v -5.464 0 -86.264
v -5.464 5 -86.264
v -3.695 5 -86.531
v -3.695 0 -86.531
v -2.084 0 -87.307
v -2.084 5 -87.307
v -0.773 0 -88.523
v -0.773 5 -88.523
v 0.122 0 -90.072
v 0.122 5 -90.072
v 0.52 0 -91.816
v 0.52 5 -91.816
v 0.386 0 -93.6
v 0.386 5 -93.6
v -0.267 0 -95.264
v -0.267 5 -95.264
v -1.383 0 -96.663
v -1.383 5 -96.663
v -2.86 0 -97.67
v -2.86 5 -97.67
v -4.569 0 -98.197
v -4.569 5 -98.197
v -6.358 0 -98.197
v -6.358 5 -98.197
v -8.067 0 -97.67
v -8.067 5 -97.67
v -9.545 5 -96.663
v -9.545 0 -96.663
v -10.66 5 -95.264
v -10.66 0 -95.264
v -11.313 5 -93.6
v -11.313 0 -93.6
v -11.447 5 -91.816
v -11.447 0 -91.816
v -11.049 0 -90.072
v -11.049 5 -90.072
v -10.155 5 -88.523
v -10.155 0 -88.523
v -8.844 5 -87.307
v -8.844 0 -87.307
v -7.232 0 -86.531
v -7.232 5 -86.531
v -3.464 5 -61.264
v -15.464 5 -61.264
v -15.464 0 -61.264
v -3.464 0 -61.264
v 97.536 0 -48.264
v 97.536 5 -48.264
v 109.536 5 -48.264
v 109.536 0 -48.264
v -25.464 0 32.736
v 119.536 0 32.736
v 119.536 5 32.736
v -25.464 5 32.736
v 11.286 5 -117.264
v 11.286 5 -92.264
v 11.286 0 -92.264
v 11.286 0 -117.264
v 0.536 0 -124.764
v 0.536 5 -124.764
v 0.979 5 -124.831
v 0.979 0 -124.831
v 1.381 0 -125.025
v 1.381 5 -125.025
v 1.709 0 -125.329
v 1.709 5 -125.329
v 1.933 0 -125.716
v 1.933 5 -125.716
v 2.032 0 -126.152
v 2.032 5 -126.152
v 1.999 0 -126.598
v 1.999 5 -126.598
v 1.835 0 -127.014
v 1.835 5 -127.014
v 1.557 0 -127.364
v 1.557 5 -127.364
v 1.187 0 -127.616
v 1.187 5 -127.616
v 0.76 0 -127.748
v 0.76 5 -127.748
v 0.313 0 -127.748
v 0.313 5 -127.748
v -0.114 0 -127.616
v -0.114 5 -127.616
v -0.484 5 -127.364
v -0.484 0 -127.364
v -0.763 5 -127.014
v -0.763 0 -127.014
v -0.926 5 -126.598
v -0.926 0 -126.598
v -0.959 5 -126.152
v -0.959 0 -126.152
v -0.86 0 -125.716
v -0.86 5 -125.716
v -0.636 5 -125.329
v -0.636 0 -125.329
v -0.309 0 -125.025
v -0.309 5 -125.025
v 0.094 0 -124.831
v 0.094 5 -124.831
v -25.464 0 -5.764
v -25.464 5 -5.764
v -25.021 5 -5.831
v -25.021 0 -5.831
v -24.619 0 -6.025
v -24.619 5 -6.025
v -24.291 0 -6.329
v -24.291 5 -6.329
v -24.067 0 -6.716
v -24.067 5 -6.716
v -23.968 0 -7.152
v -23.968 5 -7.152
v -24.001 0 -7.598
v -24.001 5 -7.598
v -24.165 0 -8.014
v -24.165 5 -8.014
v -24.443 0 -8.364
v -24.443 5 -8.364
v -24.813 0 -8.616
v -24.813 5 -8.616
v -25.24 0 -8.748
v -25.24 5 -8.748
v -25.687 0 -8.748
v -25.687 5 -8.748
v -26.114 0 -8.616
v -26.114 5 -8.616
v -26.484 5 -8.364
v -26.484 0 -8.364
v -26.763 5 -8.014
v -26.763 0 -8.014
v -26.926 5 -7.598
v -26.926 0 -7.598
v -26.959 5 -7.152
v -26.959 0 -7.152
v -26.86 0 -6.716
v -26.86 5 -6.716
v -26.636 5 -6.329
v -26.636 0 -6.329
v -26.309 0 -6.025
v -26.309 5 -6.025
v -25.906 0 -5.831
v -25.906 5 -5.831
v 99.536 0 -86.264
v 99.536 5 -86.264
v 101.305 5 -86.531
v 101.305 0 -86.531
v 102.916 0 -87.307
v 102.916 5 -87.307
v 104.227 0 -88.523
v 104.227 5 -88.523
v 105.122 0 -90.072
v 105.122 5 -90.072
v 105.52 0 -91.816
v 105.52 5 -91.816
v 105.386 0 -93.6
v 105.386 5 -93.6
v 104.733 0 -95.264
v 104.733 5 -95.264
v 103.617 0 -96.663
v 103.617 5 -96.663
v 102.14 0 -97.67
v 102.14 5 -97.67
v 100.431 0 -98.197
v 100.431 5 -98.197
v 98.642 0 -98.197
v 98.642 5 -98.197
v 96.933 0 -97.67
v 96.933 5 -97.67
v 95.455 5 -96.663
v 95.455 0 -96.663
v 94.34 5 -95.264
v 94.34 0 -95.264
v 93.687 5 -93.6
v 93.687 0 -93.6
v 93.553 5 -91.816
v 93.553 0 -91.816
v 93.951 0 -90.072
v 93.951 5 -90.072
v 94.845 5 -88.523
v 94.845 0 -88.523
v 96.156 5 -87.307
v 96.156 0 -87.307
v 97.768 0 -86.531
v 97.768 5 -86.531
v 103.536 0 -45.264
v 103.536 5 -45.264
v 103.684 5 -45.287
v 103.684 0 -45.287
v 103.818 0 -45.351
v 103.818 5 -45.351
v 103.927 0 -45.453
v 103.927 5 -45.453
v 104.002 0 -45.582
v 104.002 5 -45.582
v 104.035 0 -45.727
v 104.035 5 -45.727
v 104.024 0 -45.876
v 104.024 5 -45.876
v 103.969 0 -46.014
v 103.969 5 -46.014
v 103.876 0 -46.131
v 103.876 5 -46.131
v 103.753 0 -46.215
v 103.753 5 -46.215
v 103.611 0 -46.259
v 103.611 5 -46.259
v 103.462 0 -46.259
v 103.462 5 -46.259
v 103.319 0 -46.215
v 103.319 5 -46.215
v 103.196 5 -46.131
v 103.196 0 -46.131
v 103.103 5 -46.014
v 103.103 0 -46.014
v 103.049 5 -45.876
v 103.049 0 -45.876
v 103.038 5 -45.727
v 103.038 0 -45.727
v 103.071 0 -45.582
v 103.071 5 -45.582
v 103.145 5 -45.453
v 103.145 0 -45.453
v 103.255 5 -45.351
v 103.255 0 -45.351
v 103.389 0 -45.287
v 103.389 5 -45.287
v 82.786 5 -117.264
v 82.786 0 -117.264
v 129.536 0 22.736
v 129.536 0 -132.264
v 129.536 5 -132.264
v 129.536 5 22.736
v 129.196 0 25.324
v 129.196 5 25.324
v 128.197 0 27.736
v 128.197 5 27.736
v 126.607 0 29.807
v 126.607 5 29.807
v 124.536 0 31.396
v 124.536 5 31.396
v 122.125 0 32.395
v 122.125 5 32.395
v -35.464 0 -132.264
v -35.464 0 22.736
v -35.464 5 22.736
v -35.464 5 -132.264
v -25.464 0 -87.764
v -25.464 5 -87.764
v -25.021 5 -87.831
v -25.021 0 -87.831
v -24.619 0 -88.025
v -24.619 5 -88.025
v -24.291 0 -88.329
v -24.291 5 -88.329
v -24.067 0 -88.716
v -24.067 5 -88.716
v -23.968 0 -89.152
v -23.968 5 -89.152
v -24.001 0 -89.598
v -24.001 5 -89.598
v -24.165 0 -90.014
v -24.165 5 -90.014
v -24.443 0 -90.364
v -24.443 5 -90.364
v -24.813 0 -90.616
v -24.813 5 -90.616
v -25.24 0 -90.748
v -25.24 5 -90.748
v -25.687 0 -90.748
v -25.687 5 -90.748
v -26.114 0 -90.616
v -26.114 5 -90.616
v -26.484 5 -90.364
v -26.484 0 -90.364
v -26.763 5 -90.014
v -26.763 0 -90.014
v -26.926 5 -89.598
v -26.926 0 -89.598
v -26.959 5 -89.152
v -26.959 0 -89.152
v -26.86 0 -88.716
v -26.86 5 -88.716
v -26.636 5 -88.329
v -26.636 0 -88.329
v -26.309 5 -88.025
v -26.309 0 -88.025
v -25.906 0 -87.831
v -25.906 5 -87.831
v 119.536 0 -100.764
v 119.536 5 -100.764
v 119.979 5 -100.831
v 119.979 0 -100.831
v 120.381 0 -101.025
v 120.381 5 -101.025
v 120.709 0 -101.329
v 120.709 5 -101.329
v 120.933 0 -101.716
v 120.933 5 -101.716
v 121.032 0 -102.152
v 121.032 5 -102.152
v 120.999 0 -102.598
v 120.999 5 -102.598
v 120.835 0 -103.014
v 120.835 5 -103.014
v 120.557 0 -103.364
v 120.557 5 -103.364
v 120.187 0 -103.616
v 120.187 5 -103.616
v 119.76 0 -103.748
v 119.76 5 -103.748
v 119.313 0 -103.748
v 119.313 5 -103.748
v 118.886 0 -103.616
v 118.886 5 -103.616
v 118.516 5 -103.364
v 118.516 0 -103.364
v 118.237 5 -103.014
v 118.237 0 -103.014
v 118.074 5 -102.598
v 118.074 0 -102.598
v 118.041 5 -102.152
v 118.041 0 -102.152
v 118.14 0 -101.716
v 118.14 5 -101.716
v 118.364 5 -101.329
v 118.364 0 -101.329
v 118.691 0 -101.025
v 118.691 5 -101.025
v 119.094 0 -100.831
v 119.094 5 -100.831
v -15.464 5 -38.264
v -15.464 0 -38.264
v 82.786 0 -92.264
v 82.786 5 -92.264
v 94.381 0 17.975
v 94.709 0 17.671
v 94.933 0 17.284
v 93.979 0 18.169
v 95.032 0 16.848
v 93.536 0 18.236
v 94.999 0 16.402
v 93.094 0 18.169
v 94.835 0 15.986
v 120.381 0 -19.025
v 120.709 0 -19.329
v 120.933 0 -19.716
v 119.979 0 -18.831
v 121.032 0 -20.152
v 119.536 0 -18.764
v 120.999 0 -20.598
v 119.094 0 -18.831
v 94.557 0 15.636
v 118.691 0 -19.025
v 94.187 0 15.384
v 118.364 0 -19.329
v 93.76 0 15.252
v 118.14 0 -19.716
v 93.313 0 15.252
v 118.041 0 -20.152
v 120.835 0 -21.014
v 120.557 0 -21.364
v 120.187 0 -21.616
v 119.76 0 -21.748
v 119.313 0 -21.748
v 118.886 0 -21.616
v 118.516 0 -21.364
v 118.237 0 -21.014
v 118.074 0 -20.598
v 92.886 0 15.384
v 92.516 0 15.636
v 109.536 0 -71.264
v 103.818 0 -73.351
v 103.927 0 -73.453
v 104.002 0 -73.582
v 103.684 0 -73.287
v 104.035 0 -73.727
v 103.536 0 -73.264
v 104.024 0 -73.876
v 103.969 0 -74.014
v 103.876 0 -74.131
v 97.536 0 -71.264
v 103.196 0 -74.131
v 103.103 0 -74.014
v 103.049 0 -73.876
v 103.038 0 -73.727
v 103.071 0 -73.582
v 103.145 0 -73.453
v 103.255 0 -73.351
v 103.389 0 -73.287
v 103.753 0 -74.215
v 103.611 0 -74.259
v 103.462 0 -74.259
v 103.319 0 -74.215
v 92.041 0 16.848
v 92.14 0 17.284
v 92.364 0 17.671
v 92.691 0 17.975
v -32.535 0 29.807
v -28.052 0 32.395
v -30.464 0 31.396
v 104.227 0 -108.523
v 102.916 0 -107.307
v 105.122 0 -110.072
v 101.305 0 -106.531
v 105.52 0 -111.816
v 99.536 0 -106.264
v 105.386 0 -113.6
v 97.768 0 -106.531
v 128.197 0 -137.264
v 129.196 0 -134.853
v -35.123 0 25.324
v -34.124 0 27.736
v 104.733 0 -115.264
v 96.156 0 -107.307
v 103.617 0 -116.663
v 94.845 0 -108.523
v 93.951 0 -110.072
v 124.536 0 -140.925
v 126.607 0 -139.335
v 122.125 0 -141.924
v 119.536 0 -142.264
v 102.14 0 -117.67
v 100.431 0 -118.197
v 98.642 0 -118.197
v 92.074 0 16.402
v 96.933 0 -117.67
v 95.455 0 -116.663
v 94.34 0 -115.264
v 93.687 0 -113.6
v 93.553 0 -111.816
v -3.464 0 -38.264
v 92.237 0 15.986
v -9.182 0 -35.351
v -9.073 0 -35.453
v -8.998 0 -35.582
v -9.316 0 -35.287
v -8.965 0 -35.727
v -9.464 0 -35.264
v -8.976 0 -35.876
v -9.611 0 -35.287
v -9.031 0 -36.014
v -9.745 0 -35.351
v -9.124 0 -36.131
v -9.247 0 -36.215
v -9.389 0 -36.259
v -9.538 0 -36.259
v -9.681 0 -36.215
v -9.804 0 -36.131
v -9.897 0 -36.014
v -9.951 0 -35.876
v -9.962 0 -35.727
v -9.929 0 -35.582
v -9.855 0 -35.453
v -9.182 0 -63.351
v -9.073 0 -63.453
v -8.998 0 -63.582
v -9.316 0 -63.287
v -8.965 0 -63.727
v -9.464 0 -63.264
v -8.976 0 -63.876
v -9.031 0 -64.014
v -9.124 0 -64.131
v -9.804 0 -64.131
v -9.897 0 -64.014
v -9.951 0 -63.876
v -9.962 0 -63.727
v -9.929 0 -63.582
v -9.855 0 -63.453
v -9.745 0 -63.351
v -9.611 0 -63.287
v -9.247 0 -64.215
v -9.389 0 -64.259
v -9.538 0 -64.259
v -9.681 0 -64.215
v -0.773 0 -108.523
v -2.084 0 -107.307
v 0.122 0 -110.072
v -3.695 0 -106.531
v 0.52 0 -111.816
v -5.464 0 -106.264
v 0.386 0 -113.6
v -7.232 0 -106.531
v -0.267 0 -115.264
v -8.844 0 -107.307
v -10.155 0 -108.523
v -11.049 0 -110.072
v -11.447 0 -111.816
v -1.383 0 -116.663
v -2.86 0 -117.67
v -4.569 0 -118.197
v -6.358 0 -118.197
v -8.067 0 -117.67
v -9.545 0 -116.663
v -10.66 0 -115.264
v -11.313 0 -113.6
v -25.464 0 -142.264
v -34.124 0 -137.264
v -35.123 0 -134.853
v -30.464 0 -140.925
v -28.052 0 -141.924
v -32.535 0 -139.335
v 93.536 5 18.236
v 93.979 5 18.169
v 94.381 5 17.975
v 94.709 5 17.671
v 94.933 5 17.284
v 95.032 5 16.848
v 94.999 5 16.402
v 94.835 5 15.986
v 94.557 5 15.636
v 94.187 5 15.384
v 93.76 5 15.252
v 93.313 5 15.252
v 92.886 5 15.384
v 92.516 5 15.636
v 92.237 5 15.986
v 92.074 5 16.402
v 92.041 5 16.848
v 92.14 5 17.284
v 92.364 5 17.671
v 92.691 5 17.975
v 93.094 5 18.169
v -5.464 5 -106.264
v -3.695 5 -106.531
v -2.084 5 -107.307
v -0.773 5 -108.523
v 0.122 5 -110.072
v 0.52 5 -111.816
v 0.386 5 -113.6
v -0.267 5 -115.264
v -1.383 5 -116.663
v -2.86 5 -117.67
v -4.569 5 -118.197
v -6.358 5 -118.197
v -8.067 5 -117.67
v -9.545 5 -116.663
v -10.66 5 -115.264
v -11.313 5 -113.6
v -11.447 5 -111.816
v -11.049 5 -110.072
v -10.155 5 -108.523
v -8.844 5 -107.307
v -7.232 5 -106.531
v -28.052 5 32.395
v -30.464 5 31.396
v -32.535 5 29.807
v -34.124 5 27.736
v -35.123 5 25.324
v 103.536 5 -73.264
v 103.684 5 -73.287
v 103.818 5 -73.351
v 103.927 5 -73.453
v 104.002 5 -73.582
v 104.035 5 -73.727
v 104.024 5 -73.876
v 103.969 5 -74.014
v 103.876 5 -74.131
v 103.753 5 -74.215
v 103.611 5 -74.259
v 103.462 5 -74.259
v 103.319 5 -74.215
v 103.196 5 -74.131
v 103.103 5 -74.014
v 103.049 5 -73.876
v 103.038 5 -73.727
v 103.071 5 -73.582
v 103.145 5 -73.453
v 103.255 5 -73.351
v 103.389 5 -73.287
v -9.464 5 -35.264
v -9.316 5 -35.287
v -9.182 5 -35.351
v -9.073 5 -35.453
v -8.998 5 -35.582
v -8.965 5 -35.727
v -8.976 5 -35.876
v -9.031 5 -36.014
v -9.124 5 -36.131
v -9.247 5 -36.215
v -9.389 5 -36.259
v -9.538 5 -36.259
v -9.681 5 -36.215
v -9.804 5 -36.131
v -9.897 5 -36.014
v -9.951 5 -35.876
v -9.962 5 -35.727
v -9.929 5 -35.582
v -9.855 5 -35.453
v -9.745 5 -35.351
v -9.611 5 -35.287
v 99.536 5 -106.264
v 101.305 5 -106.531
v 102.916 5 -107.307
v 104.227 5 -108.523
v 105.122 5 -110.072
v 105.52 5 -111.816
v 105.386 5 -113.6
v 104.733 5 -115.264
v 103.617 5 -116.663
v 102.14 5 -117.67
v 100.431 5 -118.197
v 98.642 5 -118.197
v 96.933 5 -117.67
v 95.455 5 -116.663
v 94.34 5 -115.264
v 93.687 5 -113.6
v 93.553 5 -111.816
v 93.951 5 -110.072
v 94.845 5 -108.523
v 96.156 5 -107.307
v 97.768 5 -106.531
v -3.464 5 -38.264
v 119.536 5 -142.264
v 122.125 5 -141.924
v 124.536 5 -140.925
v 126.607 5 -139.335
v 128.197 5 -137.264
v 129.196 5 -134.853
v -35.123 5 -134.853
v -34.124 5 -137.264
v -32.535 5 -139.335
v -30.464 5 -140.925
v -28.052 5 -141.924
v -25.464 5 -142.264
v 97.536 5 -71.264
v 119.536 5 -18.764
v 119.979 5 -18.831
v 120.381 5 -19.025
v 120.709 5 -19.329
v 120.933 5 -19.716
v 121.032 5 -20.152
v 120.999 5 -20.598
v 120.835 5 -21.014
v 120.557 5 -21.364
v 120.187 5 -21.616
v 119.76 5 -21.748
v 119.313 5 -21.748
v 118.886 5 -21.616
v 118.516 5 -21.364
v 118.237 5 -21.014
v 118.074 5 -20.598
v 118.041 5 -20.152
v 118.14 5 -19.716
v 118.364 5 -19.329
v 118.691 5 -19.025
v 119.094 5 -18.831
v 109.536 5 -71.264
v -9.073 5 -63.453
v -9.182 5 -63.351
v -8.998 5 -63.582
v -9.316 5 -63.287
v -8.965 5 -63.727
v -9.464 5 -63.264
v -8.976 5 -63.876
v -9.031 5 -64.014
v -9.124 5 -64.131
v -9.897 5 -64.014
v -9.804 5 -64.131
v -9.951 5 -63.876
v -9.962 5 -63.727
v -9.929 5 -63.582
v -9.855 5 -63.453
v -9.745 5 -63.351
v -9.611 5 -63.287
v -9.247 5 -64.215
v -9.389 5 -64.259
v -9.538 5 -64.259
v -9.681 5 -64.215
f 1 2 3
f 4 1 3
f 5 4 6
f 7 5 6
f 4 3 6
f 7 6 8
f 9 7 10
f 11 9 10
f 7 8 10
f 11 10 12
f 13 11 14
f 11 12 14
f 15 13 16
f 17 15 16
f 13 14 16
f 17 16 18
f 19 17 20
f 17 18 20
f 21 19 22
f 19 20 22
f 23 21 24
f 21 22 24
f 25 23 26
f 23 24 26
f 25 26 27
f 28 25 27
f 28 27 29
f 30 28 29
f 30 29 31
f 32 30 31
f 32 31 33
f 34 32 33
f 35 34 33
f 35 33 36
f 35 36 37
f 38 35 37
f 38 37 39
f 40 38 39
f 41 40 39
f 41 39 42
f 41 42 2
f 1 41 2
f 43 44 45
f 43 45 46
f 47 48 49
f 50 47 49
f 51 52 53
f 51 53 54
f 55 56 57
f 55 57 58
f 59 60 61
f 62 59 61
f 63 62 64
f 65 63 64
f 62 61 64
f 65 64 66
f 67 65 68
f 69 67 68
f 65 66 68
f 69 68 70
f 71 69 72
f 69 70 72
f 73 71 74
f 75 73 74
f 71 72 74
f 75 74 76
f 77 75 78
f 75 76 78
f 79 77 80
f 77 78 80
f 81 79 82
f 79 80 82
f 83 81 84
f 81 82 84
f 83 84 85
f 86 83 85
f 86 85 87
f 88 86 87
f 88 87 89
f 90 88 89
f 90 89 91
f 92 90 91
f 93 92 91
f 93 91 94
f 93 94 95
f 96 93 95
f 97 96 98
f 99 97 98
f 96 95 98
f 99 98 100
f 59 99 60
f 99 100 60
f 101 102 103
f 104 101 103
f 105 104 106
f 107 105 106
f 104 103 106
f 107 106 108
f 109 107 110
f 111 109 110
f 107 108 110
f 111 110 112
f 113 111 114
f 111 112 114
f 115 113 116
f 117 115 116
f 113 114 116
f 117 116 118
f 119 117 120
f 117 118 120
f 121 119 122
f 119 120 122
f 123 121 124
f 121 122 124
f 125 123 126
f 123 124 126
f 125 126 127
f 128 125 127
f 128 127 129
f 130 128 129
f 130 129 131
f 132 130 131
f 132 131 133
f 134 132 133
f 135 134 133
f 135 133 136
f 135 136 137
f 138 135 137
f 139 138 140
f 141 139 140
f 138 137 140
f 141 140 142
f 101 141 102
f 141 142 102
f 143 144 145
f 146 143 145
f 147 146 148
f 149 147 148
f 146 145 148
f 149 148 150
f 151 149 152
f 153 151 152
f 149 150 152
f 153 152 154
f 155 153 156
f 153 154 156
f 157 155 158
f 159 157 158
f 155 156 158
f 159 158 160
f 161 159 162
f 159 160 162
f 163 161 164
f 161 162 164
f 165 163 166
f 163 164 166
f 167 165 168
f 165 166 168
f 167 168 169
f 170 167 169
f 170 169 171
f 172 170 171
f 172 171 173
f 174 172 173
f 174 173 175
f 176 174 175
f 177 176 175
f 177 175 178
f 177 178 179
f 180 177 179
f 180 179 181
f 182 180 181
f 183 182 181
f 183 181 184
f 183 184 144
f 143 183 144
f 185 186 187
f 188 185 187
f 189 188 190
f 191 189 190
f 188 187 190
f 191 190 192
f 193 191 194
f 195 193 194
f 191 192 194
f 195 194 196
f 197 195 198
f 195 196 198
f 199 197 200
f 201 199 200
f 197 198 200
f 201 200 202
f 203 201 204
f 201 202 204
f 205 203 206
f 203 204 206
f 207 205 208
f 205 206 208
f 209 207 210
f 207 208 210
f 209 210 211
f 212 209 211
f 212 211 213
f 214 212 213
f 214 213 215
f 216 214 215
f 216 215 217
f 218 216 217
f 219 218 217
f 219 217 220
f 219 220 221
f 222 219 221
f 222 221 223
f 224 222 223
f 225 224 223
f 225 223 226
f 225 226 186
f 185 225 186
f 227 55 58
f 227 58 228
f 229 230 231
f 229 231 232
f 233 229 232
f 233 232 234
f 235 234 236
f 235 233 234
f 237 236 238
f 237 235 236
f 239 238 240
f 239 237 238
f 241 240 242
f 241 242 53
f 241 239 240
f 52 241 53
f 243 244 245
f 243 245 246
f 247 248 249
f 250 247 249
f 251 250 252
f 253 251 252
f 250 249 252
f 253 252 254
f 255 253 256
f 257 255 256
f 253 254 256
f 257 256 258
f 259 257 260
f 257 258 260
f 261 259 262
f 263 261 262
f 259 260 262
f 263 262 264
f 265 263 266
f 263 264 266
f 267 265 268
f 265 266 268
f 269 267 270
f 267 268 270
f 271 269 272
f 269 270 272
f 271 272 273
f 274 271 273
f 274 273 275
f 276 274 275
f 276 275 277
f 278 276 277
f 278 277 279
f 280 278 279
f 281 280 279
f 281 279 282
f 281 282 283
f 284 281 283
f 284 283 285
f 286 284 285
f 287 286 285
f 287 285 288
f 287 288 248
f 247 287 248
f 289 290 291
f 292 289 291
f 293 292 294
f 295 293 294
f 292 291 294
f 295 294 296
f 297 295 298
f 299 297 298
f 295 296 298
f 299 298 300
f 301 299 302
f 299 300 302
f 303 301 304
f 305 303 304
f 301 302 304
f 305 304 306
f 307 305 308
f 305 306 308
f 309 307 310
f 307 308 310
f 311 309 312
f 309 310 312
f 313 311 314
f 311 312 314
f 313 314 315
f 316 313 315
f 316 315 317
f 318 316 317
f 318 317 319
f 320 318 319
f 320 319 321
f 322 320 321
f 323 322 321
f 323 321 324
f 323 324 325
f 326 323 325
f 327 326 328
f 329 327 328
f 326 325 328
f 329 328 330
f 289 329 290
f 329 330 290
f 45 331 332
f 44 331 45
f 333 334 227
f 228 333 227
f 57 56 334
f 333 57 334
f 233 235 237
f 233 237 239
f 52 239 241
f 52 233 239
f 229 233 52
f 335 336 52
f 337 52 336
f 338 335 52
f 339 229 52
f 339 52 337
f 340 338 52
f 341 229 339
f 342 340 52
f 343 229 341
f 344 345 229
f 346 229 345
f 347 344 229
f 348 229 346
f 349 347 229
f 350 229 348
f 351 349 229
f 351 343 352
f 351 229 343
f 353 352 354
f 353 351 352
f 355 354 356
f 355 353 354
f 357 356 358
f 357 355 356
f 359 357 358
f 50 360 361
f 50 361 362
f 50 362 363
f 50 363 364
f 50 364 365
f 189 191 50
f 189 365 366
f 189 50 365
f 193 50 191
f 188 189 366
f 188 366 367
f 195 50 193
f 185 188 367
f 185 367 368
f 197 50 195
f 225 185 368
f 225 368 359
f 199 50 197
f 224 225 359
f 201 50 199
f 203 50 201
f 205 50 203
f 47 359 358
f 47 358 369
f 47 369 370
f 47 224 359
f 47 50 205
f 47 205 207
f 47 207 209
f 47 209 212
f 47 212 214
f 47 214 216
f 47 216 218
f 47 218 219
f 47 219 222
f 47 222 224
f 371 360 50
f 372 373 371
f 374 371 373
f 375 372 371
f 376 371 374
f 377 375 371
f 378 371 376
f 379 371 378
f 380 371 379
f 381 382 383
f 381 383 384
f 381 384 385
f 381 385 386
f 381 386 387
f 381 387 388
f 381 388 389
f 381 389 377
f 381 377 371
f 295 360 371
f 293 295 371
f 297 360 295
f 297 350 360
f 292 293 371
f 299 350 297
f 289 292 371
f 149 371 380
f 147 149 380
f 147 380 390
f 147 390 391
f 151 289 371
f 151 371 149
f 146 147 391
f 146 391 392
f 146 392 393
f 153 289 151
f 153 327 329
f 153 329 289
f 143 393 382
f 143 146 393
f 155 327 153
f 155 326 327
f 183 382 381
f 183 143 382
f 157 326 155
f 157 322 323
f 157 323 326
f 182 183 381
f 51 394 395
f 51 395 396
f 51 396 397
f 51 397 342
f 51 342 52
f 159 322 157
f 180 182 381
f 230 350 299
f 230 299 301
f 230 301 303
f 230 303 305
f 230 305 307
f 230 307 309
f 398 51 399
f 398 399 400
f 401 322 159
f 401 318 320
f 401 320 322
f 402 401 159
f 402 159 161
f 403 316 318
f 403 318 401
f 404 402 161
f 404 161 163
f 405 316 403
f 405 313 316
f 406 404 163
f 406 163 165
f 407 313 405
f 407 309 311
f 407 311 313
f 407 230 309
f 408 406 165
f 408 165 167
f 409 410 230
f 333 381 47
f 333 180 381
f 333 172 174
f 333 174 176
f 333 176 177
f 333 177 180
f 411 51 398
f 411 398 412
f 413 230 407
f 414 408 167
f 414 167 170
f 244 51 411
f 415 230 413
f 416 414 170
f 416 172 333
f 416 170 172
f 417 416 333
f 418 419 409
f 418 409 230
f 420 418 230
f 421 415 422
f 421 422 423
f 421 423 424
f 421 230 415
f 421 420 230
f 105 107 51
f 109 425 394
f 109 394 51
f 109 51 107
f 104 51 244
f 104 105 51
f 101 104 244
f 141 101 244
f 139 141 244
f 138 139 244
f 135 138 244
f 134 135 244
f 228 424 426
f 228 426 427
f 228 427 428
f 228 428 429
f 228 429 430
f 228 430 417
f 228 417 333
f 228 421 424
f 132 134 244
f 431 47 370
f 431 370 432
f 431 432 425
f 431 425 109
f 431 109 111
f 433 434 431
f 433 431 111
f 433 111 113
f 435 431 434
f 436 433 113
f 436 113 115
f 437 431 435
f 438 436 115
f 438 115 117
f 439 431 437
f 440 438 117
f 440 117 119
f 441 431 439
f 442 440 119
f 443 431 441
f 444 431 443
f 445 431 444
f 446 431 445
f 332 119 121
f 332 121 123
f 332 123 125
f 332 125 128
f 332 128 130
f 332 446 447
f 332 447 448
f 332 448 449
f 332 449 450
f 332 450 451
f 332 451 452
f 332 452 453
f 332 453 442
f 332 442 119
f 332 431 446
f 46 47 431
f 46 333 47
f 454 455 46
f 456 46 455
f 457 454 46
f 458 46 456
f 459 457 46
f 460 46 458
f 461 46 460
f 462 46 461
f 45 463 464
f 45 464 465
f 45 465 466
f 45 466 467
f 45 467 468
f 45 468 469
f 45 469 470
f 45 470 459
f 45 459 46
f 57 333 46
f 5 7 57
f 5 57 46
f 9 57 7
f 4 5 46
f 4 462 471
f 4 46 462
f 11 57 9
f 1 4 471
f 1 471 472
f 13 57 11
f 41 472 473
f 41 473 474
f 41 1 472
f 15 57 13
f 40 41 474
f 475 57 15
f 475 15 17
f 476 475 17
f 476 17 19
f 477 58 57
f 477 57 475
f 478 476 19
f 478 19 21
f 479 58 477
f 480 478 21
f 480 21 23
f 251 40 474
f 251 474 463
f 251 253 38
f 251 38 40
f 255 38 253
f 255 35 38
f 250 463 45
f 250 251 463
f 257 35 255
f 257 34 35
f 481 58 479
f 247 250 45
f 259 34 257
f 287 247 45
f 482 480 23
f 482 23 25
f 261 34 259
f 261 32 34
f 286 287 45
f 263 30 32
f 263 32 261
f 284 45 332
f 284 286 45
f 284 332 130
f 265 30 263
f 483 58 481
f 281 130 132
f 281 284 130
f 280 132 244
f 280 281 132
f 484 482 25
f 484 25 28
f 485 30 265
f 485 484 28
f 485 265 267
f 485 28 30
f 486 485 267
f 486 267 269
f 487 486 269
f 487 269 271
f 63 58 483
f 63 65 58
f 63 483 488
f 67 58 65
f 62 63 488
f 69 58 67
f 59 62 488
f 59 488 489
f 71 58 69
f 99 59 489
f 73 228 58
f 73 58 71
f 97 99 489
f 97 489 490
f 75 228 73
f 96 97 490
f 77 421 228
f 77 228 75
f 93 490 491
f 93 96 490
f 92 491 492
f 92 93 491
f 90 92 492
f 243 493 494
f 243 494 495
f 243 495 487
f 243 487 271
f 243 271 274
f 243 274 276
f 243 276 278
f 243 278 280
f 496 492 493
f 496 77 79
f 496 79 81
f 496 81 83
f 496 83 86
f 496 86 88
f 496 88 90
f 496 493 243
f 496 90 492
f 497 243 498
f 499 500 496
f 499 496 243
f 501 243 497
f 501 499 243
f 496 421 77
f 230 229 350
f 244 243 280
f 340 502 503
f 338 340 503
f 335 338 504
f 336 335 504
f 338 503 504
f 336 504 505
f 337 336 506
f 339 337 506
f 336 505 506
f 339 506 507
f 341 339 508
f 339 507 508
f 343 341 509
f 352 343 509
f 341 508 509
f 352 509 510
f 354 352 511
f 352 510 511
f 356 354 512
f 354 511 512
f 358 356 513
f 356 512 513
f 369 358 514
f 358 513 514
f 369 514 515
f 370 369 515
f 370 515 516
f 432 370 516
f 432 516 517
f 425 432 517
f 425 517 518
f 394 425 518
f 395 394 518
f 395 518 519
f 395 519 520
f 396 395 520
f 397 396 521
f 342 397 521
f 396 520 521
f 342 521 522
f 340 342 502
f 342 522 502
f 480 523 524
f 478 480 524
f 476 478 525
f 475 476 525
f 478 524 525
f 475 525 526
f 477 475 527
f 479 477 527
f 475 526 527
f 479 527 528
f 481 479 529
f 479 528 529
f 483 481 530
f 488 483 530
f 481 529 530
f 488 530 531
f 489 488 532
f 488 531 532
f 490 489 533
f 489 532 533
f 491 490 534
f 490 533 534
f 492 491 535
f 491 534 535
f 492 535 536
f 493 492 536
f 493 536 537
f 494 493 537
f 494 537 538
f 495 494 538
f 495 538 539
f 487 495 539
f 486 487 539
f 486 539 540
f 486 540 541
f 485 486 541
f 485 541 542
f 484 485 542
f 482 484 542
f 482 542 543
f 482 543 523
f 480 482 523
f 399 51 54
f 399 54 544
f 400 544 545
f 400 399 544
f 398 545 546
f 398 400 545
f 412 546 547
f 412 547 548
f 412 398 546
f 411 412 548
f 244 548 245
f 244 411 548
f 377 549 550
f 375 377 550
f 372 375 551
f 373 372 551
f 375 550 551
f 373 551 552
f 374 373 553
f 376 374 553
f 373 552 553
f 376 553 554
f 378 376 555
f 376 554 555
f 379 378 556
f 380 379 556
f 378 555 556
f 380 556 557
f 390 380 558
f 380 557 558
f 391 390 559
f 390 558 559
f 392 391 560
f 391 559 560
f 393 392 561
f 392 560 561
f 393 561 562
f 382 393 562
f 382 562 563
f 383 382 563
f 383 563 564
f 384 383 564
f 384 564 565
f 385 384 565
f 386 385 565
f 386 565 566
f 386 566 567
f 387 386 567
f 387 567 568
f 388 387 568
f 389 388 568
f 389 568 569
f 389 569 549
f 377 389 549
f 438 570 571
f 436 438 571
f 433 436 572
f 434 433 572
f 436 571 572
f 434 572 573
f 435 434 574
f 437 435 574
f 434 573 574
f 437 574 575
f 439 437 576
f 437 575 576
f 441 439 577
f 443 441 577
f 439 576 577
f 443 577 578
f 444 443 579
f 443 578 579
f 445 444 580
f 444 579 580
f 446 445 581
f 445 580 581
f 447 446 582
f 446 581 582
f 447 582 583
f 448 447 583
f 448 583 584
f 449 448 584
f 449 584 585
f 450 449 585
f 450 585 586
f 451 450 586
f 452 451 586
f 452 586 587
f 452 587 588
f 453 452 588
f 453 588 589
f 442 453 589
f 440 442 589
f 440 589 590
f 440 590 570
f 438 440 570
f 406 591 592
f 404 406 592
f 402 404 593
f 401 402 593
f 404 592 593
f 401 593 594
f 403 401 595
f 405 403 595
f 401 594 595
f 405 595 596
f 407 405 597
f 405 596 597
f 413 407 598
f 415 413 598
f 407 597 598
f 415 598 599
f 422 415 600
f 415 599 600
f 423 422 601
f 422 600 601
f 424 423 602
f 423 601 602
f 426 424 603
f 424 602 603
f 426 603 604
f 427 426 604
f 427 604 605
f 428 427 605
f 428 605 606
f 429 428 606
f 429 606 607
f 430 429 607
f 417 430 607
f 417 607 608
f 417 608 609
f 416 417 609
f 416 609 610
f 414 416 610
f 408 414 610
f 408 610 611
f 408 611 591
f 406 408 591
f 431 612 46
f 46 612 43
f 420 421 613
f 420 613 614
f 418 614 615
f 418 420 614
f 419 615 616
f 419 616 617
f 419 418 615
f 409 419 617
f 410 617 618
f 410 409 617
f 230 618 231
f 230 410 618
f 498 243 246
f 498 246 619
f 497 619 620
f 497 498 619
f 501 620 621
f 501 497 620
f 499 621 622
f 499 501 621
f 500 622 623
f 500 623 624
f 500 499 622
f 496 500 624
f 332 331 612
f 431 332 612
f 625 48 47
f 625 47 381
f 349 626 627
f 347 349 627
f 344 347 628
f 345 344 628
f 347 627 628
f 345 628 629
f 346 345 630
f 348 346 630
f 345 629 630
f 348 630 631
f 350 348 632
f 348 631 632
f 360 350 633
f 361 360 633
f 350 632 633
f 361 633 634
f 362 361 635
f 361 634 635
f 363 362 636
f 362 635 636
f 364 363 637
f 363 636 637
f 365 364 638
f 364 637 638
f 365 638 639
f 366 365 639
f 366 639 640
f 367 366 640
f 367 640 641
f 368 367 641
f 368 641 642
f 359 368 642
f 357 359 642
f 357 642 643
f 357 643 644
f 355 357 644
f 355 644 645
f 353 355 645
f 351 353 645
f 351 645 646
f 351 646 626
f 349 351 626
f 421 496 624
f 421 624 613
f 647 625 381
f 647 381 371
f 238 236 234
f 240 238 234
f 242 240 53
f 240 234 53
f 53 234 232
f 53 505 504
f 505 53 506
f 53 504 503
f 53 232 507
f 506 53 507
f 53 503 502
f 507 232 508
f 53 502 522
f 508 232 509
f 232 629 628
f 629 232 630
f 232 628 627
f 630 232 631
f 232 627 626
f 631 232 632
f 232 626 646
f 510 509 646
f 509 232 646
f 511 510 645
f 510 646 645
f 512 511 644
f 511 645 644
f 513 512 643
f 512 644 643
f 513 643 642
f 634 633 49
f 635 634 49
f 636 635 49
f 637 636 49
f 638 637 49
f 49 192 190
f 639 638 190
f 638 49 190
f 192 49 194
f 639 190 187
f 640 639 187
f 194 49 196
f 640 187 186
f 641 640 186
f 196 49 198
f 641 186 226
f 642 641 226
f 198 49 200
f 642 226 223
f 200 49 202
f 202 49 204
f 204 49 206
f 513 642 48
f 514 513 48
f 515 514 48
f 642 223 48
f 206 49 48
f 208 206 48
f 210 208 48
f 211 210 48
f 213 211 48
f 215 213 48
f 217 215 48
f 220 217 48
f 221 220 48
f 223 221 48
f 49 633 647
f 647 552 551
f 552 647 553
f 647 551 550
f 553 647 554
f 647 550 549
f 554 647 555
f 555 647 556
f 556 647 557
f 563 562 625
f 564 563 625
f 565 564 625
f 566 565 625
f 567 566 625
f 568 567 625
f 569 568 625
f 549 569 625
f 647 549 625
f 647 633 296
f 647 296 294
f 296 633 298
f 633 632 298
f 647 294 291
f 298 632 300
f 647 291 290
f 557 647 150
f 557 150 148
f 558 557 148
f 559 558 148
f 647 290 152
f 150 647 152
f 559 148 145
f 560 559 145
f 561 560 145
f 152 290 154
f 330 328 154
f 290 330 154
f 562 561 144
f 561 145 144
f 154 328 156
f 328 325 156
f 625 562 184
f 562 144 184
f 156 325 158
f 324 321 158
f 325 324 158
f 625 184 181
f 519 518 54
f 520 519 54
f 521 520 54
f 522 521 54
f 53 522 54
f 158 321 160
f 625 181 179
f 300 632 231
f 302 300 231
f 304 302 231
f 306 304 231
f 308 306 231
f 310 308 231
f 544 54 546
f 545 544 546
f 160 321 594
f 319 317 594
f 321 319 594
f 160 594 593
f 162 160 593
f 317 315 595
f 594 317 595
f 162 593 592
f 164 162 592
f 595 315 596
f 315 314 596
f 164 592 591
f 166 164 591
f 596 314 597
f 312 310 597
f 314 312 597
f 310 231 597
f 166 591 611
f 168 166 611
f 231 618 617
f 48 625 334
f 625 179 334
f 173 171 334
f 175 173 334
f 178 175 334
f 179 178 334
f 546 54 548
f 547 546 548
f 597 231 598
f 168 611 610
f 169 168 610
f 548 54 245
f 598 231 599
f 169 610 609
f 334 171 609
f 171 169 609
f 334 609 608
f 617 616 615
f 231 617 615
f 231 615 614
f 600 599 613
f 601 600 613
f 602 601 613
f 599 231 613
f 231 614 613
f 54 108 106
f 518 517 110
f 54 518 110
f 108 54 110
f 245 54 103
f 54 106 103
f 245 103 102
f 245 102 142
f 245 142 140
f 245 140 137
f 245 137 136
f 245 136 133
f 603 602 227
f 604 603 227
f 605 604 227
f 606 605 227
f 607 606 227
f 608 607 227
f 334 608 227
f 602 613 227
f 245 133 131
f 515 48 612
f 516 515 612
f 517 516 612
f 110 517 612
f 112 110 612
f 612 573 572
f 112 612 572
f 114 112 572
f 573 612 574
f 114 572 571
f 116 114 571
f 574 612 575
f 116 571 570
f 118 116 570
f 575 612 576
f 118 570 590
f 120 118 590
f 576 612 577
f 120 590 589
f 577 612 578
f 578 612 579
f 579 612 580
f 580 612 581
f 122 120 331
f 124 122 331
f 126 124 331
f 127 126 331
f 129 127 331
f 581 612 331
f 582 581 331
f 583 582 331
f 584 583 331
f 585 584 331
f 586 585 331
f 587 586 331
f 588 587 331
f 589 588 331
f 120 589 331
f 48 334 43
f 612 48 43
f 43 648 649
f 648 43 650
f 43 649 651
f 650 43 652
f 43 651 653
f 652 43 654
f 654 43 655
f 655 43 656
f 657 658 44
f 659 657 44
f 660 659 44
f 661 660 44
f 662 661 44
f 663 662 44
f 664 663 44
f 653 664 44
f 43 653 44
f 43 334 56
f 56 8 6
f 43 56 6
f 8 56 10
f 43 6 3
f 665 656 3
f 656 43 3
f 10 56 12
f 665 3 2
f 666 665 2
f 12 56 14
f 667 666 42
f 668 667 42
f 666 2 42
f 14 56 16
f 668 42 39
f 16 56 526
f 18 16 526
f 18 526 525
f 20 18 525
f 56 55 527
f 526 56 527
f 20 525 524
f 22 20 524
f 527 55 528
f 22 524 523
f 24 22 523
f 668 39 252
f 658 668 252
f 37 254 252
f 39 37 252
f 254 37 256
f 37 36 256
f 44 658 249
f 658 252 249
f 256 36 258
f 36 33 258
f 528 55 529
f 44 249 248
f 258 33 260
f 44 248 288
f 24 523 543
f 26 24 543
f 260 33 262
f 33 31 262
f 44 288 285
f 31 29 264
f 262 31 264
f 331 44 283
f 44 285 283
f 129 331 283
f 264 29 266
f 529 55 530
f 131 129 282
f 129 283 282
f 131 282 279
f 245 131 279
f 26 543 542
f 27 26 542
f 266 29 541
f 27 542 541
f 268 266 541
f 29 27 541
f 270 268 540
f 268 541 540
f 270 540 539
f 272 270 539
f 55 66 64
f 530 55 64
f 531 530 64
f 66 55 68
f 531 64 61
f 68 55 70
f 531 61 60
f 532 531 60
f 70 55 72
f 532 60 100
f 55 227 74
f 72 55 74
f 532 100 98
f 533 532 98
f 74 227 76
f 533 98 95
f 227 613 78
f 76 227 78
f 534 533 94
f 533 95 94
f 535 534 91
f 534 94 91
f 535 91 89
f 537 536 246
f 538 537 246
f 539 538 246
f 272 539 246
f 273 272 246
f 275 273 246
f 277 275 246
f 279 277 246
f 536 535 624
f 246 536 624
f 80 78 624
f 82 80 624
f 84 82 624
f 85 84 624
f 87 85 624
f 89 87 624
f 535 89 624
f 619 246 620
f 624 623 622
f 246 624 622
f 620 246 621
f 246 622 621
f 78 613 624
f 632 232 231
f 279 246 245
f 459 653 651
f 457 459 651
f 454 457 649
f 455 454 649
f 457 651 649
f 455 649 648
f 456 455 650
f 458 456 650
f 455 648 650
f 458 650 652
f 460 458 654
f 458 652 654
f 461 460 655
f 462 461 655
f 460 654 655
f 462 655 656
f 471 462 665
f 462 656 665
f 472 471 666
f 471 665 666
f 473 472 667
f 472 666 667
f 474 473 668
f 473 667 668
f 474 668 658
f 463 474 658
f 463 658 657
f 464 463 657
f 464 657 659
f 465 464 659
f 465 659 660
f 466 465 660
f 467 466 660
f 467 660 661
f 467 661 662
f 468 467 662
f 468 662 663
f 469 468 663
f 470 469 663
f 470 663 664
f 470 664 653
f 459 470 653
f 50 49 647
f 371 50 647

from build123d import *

# Parameters (mm, degrees)
RESSALTO_EXTRUS_O1_DEPTH = 5
ESBO_O2_R                = 1.5
CORTE_EXTRUS_O1_DEPTH    = 5
ESBO_O4_R                = 0.5
ESBO_O4_W                = 12
ESBO_O4_H                = 23
CORTE_EXTRUS_O3_DEPTH    = 193.467750623
ESBO_O5_R                = 1.5
ESBO_O5_W                = 71.5
ESBO_O5_H                = 25
CORTE_EXTRUS_O4_DEPTH    = 193.467750623
ESBO_O6_R                = 6
CORTE_EXTRUS_O5_DEPTH    = 193.467750623


with BuildPart() as part:
    # Esboço1 → Ressalto-extrusão1 (new body)
    with BuildSketch(Plane(origin=(0, 0, 0), x_dir=(1, 0, 0), z_dir=(0, 1, 0))):
        with BuildLine():
            Line((-25.463589741, 142.264378701), (119.536410259, 142.264378701))
            ThreePointArc((119.536410259, 142.264378701), (126.607478071, 139.335446513), (129.536410259, 132.264378701))
            Line((129.536410259, 132.264378701), (129.536410259, -22.735621299))
            ThreePointArc((129.536410259, -22.735621299), (126.607478071, -29.806689111), (119.536410259, -32.735621299))
            Line((119.536410259, -32.735621299), (-25.463589741, -32.735621299))
            ThreePointArc((-25.463589741, -32.735621299), (-32.534657553, -29.806689111), (-35.463589741, -22.735621299))
            Line((-35.463589741, -22.735621299), (-35.463589741, 132.264378701))
            ThreePointArc((-35.463589741, 132.264378701), (-32.534657553, 139.335446513), (-25.463589741, 142.264378701))
        make_face()
    extrude(amount=RESSALTO_EXTRUS_O1_DEPTH)

    # Esboço2 → Corte-extrusão1 (cut)
    with BuildSketch(Plane(origin=(0, 5, 0), x_dir=(1, 0, 0), z_dir=(0, 1, 0))):
        with Locations(Location((-25.463589741, 7.264378701, 0), (0, 0, 270))):
            Circle(ESBO_O2_R)
        with Locations(Location((0.536410259, 126.264378701, 0), (0, 0, 270))):
            Circle(ESBO_O2_R)
        with Locations(Location((119.536410259, 102.264378701, 0), (0, 0, 270))):
            Circle(ESBO_O2_R)
        with Locations(Location((93.536410259, -16.735621299, 0), (0, 0, 270))):
            Circle(ESBO_O2_R)
    extrude(amount=-CORTE_EXTRUS_O1_DEPTH, mode=Mode.SUBTRACT)

    # Esboço4 → Corte-extrusão3 (cut, through all)
    with BuildSketch(Plane(origin=(0, 5, 0), x_dir=(1, 0, 0), z_dir=(0, 1, 0))):
        with Locations(Location((-9.463589741, 35.764378701, 0), (0, 0, 270))):
            Circle(ESBO_O4_R)
        with Locations(Location((-9.463589741, 63.764378701, 0), (0, 0, 270))):
            Circle(ESBO_O4_R)
        with Locations(Location((103.536410259, 45.764378701, 0), (0, 0, 270))):
            Circle(ESBO_O4_R)
        with Locations(Location((103.536410259, 73.764378701, 0), (0, 0, 270))):
            Circle(ESBO_O4_R)
        with Locations((-9.463589741, 49.764378701)):
            Rectangle(ESBO_O4_W, ESBO_O4_H)
        with Locations((103.536410259, 59.764378701)):
            Rectangle(ESBO_O4_W, ESBO_O4_H)
    extrude(amount=-CORTE_EXTRUS_O3_DEPTH, mode=Mode.SUBTRACT)

    # Esboço5 → Corte-extrusão4 (cut, through all)
    with BuildSketch(Plane(origin=(0, 5, 0), x_dir=(1, 0, 0), z_dir=(0, 1, 0))):
        with Locations(Location((-25.463589741, 89.264378701, 0), (0, 0, 270))):
            Circle(ESBO_O5_R)
        with Locations(Location((119.536410259, 20.264378701, 0), (0, 0, 270))):
            Circle(ESBO_O5_R)
        with Locations((47.036410259, 104.764378701)):
            Rectangle(ESBO_O5_W, ESBO_O5_H)
    extrude(amount=-CORTE_EXTRUS_O4_DEPTH, mode=Mode.SUBTRACT)

    # Esboço6 → Corte-extrusão5 (cut, through all)
    with BuildSketch(Plane(origin=(0, 5, 0), x_dir=(1, 0, 0), z_dir=(0, 1, 0))):
        with Locations(Location((-5.463589741, 112.264378701, 0), (0, 0, 270))):
            Circle(ESBO_O6_R)
        with Locations(Location((-5.463589741, 92.264378701, 0), (0, 0, 270))):
            Circle(ESBO_O6_R)
        with Locations(Location((99.536410259, 112.264378701, 0), (0, 0, 270))):
            Circle(ESBO_O6_R)
        with Locations(Location((99.536410259, 92.264378701, 0), (0, 0, 270))):
            Circle(ESBO_O6_R)
    extrude(amount=-CORTE_EXTRUS_O5_DEPTH, mode=Mode.SUBTRACT)


solid = part.part
